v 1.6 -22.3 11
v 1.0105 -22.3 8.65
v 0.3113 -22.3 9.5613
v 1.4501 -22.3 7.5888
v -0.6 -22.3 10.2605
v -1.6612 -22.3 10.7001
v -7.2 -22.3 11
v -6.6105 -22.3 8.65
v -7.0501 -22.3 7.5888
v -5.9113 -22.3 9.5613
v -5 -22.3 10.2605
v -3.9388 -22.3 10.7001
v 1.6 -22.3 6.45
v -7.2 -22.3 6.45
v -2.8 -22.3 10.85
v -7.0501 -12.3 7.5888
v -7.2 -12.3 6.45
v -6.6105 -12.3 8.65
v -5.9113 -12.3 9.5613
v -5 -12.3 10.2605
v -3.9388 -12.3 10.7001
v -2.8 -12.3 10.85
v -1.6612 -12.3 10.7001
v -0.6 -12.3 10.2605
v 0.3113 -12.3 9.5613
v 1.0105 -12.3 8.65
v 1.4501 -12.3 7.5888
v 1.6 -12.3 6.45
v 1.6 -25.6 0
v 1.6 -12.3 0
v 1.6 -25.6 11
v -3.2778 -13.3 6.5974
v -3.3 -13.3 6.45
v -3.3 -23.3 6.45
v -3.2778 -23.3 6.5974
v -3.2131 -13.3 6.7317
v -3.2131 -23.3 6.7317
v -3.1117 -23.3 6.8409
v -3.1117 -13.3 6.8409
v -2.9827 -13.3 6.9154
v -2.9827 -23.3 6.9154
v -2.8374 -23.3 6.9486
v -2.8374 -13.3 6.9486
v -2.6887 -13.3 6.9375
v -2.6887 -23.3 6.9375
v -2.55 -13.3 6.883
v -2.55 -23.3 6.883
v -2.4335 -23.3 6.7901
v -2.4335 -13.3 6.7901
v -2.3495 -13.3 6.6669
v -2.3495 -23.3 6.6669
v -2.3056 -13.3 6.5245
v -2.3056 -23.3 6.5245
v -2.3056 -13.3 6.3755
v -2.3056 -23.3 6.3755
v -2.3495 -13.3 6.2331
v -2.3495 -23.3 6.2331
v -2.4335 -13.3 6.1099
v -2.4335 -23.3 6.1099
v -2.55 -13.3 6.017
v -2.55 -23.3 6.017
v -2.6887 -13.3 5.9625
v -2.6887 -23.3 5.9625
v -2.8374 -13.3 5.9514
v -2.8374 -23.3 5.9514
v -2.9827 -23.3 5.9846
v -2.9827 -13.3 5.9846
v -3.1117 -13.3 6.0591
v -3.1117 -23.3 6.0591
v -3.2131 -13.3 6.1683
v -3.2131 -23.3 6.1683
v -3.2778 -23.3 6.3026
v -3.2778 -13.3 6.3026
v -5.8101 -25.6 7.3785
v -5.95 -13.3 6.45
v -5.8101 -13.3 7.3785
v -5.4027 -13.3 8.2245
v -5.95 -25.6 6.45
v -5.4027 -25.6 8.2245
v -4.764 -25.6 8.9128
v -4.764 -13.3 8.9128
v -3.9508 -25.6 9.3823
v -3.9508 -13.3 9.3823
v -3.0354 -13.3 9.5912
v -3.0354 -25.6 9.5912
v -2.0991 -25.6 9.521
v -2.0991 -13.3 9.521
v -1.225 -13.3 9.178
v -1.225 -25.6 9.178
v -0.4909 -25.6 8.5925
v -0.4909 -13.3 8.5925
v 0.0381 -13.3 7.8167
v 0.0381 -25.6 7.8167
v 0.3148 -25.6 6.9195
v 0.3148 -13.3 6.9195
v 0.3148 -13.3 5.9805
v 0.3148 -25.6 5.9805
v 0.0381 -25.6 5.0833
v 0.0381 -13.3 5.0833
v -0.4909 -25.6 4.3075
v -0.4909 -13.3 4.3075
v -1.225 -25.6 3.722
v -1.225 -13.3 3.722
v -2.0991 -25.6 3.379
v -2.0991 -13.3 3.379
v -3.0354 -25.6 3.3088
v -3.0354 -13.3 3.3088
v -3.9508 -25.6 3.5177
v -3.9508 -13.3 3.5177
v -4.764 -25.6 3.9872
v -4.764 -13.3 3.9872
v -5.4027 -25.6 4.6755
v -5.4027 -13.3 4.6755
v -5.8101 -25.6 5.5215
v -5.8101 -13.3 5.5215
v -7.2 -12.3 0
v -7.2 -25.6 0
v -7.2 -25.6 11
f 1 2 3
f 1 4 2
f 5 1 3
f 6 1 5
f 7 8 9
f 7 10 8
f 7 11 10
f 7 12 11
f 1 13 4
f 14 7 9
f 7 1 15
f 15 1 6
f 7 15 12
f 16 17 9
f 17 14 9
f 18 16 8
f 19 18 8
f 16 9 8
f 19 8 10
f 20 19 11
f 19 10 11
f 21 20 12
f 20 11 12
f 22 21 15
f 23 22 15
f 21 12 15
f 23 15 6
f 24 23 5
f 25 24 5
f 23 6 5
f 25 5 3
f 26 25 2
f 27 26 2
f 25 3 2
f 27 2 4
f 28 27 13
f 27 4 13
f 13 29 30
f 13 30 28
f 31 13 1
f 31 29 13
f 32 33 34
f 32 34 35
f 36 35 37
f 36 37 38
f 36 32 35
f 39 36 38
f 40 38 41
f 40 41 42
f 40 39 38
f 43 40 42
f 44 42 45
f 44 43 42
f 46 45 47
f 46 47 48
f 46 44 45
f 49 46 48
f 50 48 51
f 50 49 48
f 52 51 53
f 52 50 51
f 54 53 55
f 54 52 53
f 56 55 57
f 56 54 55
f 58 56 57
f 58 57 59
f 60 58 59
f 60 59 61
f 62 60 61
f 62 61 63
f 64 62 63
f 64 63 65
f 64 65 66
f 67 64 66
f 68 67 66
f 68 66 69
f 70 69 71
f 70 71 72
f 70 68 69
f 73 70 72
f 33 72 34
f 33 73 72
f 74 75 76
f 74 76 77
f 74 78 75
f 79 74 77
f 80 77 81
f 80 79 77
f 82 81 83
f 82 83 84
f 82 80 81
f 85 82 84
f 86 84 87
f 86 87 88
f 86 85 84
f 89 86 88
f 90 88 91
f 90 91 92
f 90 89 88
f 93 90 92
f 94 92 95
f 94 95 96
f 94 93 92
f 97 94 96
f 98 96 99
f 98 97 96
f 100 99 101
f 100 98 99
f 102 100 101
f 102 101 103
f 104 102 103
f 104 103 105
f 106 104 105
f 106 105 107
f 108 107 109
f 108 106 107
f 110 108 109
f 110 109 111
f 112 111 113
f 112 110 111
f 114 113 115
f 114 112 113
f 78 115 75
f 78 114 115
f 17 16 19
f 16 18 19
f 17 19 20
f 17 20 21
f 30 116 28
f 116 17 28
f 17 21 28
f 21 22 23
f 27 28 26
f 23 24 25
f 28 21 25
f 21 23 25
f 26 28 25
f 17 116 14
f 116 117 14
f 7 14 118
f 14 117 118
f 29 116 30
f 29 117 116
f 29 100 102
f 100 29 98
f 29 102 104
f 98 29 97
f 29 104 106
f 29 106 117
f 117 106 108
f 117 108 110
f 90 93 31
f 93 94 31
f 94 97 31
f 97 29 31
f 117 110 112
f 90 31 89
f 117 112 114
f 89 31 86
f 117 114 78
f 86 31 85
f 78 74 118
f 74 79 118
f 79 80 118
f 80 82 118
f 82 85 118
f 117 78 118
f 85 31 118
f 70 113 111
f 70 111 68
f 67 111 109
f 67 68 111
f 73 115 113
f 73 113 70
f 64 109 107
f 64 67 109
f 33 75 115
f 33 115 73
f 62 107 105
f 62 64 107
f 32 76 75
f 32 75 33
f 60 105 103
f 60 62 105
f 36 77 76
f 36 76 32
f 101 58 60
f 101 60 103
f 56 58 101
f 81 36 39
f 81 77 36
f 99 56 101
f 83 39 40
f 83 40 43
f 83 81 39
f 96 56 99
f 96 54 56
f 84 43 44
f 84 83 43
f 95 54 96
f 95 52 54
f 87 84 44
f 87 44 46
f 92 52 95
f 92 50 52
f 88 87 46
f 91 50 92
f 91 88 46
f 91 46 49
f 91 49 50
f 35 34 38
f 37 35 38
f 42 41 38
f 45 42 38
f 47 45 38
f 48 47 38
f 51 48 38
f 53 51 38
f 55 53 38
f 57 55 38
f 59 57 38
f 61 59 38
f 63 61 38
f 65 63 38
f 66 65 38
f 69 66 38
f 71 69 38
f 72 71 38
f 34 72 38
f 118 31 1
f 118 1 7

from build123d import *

# Parameters (mm, degrees)
SKETCH074_W  = 8.8
SKETCH074_H  = 11
SKETCH074_R  = 3.15
PAD098_DEPTH = 3.3
SKETCH072_R  = 3.15
PAD099_DEPTH = 9
PAD097_DEPTH = 1
SKETCH073_R  = 0.5
PAD096_DEPTH = 10


with BuildPart() as part:
    # Sketch074 → Pad098 (new body)
    with BuildSketch(Plane(origin=(0, -6.3, 0), x_dir=(-1, 0, 0), z_dir=(0, 1, 0))):
        with Locations((0, 5.5)):
            Rectangle(SKETCH074_W, SKETCH074_H)
        with Locations((0, 6.45)):
            Circle(SKETCH074_R, mode=Mode.SUBTRACT)
    extrude(amount=PAD098_DEPTH)

    # Sketch072 → Pad099 (join)
    with BuildSketch(Plane(origin=(0, -3, 0), x_dir=(-1, 0, 0), z_dir=(0, 1, 0))):
        with BuildLine():
            Line((4.4, 0), (-4.4, 0))
            Line((-4.4, 0), (-4.4, 6.45))
            ThreePointArc((4.4, 6.45), (0, 10.85), (-4.4, 6.45))
            Line((4.4, 6.45), (4.4, 0))
        make_face()
        with Locations((0, 6.45)):
            Circle(SKETCH072_R, mode=Mode.SUBTRACT)
    extrude(amount=PAD099_DEPTH)

    # Sketch075 → Pad097 (join)
    with BuildSketch(Plane(origin=(0, 6, 0), x_dir=(-1, 0, 0), z_dir=(0, 1, 0))):
        with BuildLine():
            Line((4.4, 0), (-4.4, 0))
            Line((-4.4, 0), (-4.4, 6.45))
            ThreePointArc((4.4, 6.45), (0, 10.85), (-4.4, 6.45))
            Line((4.4, 0), (4.4, 6.45))
        make_face()
    extrude(amount=PAD097_DEPTH)

    # Sketch073 → Pad096 (join)
    with BuildSketch(Plane(origin=(0, 6, 0), x_dir=(-1, 0, 0), z_dir=(0, 1, 0))):
        with Locations((0, 6.45)):
            Circle(SKETCH073_R)
    extrude(amount=-PAD096_DEPTH)


with BuildPart() as part_1:
    # Body015 placement: moved
    add(part.part.moved(Location((-2.8, -19.3, 0))))


solid = part_1.part
